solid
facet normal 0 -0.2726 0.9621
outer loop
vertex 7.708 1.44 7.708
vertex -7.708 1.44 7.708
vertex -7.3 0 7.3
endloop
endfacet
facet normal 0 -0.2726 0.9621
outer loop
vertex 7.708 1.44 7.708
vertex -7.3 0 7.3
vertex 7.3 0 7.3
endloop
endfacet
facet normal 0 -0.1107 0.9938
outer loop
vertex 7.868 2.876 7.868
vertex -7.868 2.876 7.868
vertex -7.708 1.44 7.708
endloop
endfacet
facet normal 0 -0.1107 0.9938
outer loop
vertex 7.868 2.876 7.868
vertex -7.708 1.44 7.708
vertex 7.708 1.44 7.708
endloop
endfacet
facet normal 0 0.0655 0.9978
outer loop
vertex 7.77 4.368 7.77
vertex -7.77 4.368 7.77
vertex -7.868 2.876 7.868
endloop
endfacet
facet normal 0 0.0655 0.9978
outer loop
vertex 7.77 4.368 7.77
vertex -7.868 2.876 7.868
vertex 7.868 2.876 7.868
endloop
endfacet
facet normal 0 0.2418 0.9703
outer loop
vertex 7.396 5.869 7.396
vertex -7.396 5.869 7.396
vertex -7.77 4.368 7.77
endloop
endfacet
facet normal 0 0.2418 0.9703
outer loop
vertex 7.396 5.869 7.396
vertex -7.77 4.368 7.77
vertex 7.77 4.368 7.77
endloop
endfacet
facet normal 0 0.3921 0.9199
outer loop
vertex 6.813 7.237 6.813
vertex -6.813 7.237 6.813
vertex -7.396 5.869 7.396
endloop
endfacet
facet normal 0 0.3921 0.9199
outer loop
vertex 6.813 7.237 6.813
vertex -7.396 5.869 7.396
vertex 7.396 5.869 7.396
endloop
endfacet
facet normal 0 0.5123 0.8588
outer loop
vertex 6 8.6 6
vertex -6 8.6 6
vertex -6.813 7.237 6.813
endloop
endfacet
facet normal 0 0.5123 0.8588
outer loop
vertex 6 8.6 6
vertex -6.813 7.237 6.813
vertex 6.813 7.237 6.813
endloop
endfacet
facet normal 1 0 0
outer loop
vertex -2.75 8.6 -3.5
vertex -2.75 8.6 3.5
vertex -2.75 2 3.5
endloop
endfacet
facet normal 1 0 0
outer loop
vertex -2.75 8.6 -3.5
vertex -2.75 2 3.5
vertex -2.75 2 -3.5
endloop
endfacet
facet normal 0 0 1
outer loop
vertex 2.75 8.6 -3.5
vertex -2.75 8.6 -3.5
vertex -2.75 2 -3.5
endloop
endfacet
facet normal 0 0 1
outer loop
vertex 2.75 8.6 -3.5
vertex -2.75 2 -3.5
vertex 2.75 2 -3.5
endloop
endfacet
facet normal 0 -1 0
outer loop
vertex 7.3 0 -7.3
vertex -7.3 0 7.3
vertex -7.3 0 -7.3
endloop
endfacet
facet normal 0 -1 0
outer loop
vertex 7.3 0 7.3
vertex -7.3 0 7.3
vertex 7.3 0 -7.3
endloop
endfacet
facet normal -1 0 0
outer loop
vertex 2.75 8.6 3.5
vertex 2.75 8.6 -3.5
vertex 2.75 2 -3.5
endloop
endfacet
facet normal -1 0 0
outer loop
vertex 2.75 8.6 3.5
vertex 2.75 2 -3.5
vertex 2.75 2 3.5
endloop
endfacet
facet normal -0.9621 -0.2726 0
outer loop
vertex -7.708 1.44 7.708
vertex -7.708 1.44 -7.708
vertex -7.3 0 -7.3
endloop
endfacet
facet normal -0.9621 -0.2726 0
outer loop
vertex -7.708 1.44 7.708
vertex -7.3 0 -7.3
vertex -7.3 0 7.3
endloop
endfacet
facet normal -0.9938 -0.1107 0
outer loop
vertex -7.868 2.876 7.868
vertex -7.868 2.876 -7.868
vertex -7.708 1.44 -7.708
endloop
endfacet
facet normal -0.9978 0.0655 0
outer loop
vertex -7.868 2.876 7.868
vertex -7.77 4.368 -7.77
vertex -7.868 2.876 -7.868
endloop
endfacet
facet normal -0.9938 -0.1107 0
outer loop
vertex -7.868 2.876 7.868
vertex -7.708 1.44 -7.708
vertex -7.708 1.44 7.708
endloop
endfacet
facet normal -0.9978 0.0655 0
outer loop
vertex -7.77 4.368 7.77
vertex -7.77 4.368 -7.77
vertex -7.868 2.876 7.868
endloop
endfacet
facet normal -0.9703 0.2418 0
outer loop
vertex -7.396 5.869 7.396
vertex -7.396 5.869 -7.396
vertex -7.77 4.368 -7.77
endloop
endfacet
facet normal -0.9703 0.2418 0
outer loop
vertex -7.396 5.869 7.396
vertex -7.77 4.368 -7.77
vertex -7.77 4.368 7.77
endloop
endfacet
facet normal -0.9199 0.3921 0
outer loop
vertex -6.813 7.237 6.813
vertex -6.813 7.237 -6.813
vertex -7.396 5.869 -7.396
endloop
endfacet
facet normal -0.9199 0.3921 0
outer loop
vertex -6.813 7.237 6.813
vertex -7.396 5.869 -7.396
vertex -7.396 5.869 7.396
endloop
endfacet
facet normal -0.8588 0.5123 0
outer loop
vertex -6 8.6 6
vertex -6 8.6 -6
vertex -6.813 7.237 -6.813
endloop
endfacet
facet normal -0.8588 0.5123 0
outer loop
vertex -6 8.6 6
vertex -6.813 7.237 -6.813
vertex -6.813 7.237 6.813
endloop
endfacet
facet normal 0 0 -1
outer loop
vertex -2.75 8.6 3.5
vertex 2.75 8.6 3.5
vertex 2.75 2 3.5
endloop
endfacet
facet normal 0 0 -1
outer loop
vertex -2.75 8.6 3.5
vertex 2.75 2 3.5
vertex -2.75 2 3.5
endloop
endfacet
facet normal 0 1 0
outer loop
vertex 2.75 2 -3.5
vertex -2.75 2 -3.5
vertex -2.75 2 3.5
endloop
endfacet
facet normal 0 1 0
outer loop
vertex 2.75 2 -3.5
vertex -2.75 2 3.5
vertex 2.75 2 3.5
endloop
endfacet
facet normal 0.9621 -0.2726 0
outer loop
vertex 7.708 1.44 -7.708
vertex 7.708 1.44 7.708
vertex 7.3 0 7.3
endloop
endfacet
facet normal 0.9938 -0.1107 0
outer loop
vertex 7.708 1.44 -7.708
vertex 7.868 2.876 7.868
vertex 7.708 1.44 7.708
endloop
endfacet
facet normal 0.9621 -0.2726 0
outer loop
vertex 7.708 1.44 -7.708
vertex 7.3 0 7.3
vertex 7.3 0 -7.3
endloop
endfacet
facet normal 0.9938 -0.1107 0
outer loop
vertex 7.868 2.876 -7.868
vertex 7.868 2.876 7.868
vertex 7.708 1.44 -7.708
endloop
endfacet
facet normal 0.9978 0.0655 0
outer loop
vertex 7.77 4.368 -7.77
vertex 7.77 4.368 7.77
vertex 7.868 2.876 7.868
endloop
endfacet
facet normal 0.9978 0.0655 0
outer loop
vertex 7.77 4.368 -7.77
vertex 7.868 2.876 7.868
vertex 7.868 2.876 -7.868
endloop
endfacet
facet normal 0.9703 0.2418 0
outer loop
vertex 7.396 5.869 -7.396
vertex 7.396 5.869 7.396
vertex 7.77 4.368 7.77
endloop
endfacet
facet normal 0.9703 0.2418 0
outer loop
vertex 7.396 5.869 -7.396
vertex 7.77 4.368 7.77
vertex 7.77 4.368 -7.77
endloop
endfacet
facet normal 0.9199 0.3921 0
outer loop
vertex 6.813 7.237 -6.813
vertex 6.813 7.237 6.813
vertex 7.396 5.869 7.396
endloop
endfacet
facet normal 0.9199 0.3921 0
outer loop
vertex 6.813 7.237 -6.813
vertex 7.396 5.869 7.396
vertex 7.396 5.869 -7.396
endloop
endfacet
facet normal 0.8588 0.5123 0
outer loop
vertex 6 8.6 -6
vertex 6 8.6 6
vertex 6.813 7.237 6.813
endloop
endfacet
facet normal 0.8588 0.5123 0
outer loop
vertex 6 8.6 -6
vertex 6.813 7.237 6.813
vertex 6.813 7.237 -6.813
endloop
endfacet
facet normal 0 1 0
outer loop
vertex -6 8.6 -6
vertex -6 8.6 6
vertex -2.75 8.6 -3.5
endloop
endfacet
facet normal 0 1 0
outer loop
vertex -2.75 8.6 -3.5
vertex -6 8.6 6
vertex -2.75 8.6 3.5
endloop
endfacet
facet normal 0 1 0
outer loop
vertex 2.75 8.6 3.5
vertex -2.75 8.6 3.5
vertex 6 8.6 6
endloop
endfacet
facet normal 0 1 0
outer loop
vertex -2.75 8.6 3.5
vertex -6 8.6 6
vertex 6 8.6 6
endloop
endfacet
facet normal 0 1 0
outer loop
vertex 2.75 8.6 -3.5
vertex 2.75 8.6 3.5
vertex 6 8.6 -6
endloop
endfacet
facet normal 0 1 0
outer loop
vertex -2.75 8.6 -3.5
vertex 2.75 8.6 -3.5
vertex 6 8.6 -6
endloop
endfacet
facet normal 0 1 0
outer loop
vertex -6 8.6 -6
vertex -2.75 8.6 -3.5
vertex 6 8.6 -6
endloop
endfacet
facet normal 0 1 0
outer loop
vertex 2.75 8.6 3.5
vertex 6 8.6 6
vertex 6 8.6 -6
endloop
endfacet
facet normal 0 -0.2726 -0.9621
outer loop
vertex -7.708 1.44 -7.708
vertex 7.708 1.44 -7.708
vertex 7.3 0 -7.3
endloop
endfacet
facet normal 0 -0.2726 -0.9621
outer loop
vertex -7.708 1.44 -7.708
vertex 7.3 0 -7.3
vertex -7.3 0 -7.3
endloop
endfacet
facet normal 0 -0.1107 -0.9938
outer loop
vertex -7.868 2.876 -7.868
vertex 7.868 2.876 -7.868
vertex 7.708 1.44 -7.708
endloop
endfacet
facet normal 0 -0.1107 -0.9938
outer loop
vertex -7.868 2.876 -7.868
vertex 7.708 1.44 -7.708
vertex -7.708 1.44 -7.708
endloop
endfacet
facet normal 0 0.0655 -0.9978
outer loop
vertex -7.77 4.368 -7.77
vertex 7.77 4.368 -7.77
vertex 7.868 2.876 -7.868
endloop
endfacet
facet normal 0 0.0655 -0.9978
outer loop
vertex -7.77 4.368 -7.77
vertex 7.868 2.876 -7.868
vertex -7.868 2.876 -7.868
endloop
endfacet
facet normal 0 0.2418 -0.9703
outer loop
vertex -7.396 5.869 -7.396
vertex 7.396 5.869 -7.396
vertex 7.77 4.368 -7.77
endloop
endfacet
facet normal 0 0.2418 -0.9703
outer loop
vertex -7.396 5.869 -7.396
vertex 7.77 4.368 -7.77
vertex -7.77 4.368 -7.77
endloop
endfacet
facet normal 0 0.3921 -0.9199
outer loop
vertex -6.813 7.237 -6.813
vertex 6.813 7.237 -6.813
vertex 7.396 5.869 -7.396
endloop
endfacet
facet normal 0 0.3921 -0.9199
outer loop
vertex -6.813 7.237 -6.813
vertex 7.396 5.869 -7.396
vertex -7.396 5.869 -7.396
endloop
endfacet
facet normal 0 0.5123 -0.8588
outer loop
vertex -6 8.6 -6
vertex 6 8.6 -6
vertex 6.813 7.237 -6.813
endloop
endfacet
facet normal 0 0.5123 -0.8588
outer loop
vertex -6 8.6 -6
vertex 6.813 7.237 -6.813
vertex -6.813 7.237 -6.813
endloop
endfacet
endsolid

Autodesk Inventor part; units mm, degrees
ref_plane "YZ Plane" through (0, 0, 0) normal (1, 0, 0) x (0, 1, 0)
ref_plane "XZ Plane" through (0, 0, 0) normal (0, 1, 0) x (-1, 0, 0)
sketch "Base Loop" plane through (0, 0, 0) normal (0, 1, 0) x (-1, 0, 0)
  line L0 (-7.3, 7.3) -> (7.3, 7.3)
  line L1 (7.3, 7.3) -> (7.3, -7.3)
  line L2 (7.3, -7.3) -> (-7.3, -7.3)
  line L3 (-7.3, -7.3) -> (-7.3, 7.3)
  line L4 (-7.3, 7.3) -> (7.3, -7.3) construction
  line L5 (7.3, 7.3) -> (-7.3, -7.3) construction
  point P0 (0, 0)
  point P1 (0, 0)
  point P2 (0, 0)
  dimension "d0" = 14.6
  dimension "d1" = 14.6
ref_plane "Mid Plane" through (-7.3, 2, -7.3) normal (0, 1, 0) x (1, 0, 0)
ref_plane "Base Plane" through (-7.3, 0, -7.3) normal (0, 1, 0) x (1, 0, 0)
sketch "Mid Loop" plane through (-7.3, 2, -7.3) normal (0, 1, 0) x (1, 0, 0)
  line L0 (15.1, -15.1) -> (-0.5, -15.1)
  line L1 (-0.5, -15.1) -> (-0.5, 0.5)
  line L2 (-0.5, 0.5) -> (15.1, 0.5)
  line L3 (15.1, 0.5) -> (15.1, -15.1)
  line L4 (15.1, -15.1) -> (-0.5, 0.5) construction
  line L5 (-0.5, -15.1) -> (15.1, 0.5) construction
  point P0 (7.3, -7.3)
  dimension "d3" = 15.6
  dimension "d4" = 15.6
ref_plane "Top Plane" through (-7.3, 8.6, -7.3) normal (0, 1, 0) x (1, 0, 0)
sketch "Top Loop" plane through (-7.3, 8.6, -7.3) normal (0, 1, 0) x (1, 0, 0)
  line L0 (13.3, -13.3) -> (1.3, -13.3)
  line L1 (1.3, -13.3) -> (1.3, -1.3)
  line L2 (1.3, -1.3) -> (13.3, -1.3)
  line L3 (13.3, -1.3) -> (13.3, -13.3)
  line L4 (13.3, -13.3) -> (1.3, -1.3) construction
  line L5 (1.3, -13.3) -> (13.3, -1.3) construction
  point P0 (7.3, -7.3)
  dimension "d6" = 12
  dimension "d7" = 12
loft "Keyswitch Body" add profiles "Base Loop", "Mid Loop", "Top Loop"
sketch "Cut in profile" plane through (-6, 8.6, 6) normal (0, 1, 0) x (1, 0, 0)
  line L0 (8.75, 2.5) -> (3.25, 2.5)
  line L1 (3.25, 2.5) -> (3.25, 9.5)
  line L2 (3.25, 9.5) -> (8.75, 9.5)
  line L3 (8.75, 9.5) -> (8.75, 2.5)
  line L4 (8.75, 2.5) -> (3.25, 9.5) construction
  line L5 (3.25, 2.5) -> (8.75, 9.5) construction
  point P0 (6, 6)
  dimension "d17" = 7
  dimension "d18" = 5.5
extrude "Pole Cut in" cut sketch "Cut in profile" against normal blind 6.6
equation "\"d1\" = d0"
equation "\"d3\" = s_bwidth"
equation "\"d4\" = d3"
equation "\"d17\" = s_polebl"
equation "\"d18\" = s_polebw"
equation "\"k_width\" = 18.1"
equation "\"k_height\" = 18"
equation "\"k_taper1\" = 1.5"
equation "\"k_taper2\" = 0.5"
equation "\"k_radius\" = 6"
equation "\"k_wthick\" = 1.5"
equation "\"k_ribthick\" = 1.5"
equation "\"k_ribheight\" = 5"
equation "\"k_poleoff\" = 2.2625"
equation "\"k_poledia\" = 5.54"
equation "\"k_cmxw\" = 1.35"
equation "\"k_cmxl\" = 4.4"
equation "\"s_bwidth\" = 15.6"
equation "\"s_poleh\" = 3.6"
equation "\"s_polebw\" = 5.5"
equation "\"s_polebl\" = 7"
equation "\"b_rshift\" = 49.775"
equation "\"b_ctrl\" = 22.625"
equation "\"b_space\" = 117.65"
equation "\"b_height\" = 77.4"
equation "\"b_width\" = 286.5"
equation "\"b_lshift\" = 40.725"
equation "\"b_tab\" = 27.15"
equation "\"b_pad\" = 1"
equation "\"b_caps\" = 31.675"
equation "\"k_staper\" = 1"
equation "\"k_ltaper\" = 1.5"
equation "\"k_lradius\" = 6"
equation "\"k_sradius\" = 4"
equation "\"k_height_t\" = 16"
properties part number "keyswitch-base_cherrymx"
